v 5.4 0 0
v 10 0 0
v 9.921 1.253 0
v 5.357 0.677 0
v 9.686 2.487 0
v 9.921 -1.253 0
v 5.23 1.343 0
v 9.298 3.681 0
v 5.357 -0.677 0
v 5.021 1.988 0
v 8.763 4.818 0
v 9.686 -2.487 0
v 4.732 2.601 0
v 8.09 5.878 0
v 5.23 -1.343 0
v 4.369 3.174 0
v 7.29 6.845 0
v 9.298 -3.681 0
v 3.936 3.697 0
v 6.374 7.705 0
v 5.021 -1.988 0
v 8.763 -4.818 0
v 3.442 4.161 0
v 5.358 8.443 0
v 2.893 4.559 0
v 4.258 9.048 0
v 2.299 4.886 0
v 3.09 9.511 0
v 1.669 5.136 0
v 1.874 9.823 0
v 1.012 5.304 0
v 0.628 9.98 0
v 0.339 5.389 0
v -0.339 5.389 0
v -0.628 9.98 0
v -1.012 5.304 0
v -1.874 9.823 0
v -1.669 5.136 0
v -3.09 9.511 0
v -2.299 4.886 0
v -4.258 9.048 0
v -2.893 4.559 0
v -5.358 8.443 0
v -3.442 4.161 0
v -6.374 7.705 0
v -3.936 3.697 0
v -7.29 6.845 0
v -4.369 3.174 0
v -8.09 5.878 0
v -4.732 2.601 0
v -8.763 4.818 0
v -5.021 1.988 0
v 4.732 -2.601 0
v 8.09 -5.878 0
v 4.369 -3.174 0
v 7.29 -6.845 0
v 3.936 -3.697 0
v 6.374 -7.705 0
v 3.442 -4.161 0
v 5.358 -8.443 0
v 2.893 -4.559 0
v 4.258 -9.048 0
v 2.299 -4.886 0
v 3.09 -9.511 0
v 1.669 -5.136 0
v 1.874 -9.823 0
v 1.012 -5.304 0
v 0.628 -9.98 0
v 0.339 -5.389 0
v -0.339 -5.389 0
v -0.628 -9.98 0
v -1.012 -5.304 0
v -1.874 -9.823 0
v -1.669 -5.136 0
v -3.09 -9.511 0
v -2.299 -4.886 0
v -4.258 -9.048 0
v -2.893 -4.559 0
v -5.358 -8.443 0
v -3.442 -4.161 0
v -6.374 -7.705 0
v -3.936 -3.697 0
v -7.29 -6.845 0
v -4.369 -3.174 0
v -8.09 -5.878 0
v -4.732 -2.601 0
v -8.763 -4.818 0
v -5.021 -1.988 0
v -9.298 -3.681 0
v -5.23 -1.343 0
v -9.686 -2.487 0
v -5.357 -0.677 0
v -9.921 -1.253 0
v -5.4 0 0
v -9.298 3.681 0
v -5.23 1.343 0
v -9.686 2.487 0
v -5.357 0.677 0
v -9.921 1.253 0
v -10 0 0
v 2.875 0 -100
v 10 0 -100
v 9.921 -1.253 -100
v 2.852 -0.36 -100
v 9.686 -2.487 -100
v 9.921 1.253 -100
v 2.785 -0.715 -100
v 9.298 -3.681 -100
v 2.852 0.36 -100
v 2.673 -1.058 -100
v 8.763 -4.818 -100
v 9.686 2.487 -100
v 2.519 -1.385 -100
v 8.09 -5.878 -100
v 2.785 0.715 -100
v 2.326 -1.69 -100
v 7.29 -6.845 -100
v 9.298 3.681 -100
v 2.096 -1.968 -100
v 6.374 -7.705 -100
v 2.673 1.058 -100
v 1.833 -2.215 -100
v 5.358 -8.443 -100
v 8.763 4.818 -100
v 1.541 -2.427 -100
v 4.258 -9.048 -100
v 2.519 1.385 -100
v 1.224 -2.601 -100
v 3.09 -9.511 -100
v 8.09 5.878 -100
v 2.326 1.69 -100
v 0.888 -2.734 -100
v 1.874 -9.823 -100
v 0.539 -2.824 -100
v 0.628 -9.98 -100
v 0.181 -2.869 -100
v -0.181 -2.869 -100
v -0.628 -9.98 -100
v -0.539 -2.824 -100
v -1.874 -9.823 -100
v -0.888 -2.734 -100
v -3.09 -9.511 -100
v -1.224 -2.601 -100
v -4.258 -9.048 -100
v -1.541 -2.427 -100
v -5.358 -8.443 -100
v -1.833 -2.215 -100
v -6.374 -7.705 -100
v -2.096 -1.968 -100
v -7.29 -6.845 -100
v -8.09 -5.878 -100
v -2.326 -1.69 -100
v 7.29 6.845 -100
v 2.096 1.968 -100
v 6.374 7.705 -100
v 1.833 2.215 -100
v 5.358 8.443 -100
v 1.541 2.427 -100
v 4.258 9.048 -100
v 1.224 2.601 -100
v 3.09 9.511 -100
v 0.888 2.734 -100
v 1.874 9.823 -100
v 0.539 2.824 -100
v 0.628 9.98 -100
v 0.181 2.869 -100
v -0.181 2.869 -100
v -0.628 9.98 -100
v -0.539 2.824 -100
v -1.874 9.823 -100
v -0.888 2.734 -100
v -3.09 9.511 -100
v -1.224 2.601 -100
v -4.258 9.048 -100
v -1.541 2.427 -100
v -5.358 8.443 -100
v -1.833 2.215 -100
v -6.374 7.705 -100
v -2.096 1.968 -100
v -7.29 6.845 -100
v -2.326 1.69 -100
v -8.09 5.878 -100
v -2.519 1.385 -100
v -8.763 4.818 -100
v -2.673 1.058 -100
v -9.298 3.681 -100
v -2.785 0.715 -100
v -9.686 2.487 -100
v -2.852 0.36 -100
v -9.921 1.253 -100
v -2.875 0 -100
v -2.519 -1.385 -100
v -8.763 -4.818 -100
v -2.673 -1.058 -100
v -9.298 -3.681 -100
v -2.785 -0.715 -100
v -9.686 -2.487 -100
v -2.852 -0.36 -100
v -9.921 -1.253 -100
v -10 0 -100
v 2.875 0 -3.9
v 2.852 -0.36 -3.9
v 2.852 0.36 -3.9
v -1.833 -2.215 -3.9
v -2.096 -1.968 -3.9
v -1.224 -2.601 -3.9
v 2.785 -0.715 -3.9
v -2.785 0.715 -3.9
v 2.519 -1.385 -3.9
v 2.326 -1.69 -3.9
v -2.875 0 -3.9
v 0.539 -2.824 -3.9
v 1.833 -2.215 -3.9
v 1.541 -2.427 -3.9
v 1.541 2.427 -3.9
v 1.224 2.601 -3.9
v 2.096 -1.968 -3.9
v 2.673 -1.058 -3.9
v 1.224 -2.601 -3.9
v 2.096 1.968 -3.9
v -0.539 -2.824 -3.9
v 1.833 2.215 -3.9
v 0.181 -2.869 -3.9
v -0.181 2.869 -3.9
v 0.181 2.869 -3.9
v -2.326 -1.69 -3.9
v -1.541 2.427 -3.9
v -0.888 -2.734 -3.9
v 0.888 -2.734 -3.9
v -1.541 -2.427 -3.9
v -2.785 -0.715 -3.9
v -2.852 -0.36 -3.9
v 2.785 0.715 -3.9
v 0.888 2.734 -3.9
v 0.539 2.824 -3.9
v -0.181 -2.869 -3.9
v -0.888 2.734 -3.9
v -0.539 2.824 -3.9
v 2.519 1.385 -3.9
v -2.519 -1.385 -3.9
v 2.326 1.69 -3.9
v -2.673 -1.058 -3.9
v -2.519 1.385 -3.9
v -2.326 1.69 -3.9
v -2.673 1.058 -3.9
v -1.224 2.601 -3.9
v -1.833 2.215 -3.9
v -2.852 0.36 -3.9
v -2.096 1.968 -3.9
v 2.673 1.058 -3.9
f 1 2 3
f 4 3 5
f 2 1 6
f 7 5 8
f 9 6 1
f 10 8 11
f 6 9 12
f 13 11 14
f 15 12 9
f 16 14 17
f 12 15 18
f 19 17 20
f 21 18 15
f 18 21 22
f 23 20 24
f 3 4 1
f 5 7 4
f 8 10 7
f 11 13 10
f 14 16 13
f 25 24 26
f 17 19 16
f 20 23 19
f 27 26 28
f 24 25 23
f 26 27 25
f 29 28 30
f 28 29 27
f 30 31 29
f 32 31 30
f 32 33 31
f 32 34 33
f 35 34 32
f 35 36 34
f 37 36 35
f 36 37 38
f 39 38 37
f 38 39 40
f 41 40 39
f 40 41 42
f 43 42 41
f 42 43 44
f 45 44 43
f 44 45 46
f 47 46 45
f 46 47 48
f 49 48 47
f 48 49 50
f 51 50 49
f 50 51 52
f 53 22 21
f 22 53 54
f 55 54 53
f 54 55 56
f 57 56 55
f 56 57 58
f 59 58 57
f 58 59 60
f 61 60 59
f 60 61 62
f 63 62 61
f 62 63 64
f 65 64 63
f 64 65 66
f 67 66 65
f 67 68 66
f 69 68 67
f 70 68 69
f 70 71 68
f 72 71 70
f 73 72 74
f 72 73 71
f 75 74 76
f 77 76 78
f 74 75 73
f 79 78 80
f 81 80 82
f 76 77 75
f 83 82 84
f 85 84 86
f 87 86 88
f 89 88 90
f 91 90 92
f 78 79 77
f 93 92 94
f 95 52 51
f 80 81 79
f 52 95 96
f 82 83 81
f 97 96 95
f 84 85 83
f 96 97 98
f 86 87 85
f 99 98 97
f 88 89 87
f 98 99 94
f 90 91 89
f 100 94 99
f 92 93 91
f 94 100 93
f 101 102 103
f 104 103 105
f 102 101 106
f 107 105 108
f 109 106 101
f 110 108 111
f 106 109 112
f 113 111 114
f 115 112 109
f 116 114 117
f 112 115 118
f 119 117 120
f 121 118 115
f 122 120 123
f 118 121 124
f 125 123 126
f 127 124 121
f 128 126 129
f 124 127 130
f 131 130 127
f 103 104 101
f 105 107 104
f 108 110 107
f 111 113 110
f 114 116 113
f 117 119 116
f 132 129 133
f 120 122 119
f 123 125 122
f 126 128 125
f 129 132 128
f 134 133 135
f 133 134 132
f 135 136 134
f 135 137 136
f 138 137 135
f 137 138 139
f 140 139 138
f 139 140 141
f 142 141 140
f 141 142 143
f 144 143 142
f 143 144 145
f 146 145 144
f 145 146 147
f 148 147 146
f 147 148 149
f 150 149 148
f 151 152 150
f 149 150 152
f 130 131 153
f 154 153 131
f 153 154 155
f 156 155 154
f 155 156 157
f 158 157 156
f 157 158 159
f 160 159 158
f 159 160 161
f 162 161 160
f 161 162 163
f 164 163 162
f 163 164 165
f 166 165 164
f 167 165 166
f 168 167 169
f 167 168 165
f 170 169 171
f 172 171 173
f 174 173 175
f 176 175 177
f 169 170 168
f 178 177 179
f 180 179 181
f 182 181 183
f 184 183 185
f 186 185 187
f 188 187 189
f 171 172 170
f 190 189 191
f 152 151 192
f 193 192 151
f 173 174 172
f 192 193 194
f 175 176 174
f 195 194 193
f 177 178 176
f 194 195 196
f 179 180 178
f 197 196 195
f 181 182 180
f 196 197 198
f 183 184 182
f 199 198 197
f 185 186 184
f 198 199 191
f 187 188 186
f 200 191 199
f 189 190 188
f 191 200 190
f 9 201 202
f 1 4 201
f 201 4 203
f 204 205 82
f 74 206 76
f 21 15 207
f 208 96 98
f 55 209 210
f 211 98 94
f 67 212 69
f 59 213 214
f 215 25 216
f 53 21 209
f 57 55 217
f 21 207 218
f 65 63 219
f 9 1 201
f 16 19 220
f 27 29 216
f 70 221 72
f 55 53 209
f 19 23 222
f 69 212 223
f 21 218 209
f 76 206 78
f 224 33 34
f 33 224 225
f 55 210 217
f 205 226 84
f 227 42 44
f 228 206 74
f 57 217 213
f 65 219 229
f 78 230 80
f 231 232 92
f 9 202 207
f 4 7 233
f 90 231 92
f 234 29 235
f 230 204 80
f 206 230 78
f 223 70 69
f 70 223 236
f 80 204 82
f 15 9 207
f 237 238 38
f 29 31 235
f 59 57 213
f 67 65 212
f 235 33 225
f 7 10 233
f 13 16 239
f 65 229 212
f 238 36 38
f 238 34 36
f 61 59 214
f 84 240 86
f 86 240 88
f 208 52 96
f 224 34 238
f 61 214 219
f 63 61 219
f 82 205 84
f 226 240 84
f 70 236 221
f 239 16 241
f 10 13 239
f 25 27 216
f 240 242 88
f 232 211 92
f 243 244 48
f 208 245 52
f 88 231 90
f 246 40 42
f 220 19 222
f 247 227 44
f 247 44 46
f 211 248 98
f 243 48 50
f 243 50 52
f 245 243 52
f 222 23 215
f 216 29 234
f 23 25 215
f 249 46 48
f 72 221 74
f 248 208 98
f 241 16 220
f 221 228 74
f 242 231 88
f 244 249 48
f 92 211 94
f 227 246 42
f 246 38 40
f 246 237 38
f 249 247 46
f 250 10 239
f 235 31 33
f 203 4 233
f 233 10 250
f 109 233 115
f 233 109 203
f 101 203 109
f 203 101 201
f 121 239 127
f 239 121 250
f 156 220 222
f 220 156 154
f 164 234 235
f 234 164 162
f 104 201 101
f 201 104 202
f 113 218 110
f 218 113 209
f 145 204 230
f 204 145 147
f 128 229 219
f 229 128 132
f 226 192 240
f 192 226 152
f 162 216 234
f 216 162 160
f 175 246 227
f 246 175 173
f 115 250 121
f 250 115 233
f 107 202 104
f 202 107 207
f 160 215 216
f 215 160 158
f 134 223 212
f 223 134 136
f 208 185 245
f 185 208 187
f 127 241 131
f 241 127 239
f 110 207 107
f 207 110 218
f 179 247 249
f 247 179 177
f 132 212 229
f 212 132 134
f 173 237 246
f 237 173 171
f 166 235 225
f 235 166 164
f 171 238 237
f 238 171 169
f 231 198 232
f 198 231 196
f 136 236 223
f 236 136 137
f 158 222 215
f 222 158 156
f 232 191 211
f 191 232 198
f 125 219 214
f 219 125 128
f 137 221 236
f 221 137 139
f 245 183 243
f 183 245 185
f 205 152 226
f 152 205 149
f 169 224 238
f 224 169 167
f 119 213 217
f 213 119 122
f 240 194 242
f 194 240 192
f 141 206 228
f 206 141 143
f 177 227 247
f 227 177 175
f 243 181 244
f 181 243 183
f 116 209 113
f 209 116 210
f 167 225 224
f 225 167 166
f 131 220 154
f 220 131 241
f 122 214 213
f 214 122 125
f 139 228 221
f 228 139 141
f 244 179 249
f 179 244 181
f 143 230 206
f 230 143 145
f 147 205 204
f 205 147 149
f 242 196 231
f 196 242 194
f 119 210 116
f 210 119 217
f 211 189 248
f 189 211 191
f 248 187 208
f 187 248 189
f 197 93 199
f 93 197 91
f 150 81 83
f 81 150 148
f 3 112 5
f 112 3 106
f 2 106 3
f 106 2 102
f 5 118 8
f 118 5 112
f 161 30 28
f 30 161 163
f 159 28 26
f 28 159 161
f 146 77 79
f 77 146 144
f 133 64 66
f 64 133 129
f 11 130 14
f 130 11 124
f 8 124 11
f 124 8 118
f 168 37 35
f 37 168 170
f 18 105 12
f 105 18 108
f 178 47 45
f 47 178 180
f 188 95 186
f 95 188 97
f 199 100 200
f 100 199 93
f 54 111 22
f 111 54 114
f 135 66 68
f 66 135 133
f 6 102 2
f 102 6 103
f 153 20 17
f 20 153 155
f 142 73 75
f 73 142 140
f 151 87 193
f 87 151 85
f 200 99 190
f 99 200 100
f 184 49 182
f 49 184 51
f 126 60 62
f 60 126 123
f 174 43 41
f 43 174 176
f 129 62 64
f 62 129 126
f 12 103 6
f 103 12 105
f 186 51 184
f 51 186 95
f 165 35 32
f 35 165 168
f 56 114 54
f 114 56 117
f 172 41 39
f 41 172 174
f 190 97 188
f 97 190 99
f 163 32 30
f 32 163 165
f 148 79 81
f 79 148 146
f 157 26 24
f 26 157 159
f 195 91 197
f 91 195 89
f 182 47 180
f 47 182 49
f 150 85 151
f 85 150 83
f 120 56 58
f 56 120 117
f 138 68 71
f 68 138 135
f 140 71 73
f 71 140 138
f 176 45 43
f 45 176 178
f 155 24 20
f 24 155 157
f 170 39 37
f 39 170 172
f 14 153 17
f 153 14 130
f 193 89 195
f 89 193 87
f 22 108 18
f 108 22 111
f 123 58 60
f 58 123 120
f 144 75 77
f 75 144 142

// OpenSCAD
$fn = 50;


difference() {
	union() {
		translate(v = [0, 0, -100.0000000000]) {
			cylinder(h = 100, r = 10.0000000000);
		}
		cylinder(h = 0, r = 20.0000000000);
	}
	union() {
		translate(v = [0, 0, 0]) {
			rotate(a = [0, 0, 0]) {
				difference() {
					union() {
						#translate(v = [0, 0, -100.0000000000]) {
							cylinder(h = 100, r = 2.6000000000);
						}
						#translate(v = [0, 0, -3.9000000000]) {
							cylinder(h = 3.9000000000, r1 = 2.8750000000, r2 = 5.4000000000);
						}
						#translate(v = [0, 0, -100.0000000000]) {
							cylinder(h = 100, r = 2.8750000000);
						}
						#translate(v = [0, 0, -100.0000000000]) {
							cylinder(h = 100, r = 2.6000000000);
						}
					}
					union();
				}
			}
		}
	}
}
